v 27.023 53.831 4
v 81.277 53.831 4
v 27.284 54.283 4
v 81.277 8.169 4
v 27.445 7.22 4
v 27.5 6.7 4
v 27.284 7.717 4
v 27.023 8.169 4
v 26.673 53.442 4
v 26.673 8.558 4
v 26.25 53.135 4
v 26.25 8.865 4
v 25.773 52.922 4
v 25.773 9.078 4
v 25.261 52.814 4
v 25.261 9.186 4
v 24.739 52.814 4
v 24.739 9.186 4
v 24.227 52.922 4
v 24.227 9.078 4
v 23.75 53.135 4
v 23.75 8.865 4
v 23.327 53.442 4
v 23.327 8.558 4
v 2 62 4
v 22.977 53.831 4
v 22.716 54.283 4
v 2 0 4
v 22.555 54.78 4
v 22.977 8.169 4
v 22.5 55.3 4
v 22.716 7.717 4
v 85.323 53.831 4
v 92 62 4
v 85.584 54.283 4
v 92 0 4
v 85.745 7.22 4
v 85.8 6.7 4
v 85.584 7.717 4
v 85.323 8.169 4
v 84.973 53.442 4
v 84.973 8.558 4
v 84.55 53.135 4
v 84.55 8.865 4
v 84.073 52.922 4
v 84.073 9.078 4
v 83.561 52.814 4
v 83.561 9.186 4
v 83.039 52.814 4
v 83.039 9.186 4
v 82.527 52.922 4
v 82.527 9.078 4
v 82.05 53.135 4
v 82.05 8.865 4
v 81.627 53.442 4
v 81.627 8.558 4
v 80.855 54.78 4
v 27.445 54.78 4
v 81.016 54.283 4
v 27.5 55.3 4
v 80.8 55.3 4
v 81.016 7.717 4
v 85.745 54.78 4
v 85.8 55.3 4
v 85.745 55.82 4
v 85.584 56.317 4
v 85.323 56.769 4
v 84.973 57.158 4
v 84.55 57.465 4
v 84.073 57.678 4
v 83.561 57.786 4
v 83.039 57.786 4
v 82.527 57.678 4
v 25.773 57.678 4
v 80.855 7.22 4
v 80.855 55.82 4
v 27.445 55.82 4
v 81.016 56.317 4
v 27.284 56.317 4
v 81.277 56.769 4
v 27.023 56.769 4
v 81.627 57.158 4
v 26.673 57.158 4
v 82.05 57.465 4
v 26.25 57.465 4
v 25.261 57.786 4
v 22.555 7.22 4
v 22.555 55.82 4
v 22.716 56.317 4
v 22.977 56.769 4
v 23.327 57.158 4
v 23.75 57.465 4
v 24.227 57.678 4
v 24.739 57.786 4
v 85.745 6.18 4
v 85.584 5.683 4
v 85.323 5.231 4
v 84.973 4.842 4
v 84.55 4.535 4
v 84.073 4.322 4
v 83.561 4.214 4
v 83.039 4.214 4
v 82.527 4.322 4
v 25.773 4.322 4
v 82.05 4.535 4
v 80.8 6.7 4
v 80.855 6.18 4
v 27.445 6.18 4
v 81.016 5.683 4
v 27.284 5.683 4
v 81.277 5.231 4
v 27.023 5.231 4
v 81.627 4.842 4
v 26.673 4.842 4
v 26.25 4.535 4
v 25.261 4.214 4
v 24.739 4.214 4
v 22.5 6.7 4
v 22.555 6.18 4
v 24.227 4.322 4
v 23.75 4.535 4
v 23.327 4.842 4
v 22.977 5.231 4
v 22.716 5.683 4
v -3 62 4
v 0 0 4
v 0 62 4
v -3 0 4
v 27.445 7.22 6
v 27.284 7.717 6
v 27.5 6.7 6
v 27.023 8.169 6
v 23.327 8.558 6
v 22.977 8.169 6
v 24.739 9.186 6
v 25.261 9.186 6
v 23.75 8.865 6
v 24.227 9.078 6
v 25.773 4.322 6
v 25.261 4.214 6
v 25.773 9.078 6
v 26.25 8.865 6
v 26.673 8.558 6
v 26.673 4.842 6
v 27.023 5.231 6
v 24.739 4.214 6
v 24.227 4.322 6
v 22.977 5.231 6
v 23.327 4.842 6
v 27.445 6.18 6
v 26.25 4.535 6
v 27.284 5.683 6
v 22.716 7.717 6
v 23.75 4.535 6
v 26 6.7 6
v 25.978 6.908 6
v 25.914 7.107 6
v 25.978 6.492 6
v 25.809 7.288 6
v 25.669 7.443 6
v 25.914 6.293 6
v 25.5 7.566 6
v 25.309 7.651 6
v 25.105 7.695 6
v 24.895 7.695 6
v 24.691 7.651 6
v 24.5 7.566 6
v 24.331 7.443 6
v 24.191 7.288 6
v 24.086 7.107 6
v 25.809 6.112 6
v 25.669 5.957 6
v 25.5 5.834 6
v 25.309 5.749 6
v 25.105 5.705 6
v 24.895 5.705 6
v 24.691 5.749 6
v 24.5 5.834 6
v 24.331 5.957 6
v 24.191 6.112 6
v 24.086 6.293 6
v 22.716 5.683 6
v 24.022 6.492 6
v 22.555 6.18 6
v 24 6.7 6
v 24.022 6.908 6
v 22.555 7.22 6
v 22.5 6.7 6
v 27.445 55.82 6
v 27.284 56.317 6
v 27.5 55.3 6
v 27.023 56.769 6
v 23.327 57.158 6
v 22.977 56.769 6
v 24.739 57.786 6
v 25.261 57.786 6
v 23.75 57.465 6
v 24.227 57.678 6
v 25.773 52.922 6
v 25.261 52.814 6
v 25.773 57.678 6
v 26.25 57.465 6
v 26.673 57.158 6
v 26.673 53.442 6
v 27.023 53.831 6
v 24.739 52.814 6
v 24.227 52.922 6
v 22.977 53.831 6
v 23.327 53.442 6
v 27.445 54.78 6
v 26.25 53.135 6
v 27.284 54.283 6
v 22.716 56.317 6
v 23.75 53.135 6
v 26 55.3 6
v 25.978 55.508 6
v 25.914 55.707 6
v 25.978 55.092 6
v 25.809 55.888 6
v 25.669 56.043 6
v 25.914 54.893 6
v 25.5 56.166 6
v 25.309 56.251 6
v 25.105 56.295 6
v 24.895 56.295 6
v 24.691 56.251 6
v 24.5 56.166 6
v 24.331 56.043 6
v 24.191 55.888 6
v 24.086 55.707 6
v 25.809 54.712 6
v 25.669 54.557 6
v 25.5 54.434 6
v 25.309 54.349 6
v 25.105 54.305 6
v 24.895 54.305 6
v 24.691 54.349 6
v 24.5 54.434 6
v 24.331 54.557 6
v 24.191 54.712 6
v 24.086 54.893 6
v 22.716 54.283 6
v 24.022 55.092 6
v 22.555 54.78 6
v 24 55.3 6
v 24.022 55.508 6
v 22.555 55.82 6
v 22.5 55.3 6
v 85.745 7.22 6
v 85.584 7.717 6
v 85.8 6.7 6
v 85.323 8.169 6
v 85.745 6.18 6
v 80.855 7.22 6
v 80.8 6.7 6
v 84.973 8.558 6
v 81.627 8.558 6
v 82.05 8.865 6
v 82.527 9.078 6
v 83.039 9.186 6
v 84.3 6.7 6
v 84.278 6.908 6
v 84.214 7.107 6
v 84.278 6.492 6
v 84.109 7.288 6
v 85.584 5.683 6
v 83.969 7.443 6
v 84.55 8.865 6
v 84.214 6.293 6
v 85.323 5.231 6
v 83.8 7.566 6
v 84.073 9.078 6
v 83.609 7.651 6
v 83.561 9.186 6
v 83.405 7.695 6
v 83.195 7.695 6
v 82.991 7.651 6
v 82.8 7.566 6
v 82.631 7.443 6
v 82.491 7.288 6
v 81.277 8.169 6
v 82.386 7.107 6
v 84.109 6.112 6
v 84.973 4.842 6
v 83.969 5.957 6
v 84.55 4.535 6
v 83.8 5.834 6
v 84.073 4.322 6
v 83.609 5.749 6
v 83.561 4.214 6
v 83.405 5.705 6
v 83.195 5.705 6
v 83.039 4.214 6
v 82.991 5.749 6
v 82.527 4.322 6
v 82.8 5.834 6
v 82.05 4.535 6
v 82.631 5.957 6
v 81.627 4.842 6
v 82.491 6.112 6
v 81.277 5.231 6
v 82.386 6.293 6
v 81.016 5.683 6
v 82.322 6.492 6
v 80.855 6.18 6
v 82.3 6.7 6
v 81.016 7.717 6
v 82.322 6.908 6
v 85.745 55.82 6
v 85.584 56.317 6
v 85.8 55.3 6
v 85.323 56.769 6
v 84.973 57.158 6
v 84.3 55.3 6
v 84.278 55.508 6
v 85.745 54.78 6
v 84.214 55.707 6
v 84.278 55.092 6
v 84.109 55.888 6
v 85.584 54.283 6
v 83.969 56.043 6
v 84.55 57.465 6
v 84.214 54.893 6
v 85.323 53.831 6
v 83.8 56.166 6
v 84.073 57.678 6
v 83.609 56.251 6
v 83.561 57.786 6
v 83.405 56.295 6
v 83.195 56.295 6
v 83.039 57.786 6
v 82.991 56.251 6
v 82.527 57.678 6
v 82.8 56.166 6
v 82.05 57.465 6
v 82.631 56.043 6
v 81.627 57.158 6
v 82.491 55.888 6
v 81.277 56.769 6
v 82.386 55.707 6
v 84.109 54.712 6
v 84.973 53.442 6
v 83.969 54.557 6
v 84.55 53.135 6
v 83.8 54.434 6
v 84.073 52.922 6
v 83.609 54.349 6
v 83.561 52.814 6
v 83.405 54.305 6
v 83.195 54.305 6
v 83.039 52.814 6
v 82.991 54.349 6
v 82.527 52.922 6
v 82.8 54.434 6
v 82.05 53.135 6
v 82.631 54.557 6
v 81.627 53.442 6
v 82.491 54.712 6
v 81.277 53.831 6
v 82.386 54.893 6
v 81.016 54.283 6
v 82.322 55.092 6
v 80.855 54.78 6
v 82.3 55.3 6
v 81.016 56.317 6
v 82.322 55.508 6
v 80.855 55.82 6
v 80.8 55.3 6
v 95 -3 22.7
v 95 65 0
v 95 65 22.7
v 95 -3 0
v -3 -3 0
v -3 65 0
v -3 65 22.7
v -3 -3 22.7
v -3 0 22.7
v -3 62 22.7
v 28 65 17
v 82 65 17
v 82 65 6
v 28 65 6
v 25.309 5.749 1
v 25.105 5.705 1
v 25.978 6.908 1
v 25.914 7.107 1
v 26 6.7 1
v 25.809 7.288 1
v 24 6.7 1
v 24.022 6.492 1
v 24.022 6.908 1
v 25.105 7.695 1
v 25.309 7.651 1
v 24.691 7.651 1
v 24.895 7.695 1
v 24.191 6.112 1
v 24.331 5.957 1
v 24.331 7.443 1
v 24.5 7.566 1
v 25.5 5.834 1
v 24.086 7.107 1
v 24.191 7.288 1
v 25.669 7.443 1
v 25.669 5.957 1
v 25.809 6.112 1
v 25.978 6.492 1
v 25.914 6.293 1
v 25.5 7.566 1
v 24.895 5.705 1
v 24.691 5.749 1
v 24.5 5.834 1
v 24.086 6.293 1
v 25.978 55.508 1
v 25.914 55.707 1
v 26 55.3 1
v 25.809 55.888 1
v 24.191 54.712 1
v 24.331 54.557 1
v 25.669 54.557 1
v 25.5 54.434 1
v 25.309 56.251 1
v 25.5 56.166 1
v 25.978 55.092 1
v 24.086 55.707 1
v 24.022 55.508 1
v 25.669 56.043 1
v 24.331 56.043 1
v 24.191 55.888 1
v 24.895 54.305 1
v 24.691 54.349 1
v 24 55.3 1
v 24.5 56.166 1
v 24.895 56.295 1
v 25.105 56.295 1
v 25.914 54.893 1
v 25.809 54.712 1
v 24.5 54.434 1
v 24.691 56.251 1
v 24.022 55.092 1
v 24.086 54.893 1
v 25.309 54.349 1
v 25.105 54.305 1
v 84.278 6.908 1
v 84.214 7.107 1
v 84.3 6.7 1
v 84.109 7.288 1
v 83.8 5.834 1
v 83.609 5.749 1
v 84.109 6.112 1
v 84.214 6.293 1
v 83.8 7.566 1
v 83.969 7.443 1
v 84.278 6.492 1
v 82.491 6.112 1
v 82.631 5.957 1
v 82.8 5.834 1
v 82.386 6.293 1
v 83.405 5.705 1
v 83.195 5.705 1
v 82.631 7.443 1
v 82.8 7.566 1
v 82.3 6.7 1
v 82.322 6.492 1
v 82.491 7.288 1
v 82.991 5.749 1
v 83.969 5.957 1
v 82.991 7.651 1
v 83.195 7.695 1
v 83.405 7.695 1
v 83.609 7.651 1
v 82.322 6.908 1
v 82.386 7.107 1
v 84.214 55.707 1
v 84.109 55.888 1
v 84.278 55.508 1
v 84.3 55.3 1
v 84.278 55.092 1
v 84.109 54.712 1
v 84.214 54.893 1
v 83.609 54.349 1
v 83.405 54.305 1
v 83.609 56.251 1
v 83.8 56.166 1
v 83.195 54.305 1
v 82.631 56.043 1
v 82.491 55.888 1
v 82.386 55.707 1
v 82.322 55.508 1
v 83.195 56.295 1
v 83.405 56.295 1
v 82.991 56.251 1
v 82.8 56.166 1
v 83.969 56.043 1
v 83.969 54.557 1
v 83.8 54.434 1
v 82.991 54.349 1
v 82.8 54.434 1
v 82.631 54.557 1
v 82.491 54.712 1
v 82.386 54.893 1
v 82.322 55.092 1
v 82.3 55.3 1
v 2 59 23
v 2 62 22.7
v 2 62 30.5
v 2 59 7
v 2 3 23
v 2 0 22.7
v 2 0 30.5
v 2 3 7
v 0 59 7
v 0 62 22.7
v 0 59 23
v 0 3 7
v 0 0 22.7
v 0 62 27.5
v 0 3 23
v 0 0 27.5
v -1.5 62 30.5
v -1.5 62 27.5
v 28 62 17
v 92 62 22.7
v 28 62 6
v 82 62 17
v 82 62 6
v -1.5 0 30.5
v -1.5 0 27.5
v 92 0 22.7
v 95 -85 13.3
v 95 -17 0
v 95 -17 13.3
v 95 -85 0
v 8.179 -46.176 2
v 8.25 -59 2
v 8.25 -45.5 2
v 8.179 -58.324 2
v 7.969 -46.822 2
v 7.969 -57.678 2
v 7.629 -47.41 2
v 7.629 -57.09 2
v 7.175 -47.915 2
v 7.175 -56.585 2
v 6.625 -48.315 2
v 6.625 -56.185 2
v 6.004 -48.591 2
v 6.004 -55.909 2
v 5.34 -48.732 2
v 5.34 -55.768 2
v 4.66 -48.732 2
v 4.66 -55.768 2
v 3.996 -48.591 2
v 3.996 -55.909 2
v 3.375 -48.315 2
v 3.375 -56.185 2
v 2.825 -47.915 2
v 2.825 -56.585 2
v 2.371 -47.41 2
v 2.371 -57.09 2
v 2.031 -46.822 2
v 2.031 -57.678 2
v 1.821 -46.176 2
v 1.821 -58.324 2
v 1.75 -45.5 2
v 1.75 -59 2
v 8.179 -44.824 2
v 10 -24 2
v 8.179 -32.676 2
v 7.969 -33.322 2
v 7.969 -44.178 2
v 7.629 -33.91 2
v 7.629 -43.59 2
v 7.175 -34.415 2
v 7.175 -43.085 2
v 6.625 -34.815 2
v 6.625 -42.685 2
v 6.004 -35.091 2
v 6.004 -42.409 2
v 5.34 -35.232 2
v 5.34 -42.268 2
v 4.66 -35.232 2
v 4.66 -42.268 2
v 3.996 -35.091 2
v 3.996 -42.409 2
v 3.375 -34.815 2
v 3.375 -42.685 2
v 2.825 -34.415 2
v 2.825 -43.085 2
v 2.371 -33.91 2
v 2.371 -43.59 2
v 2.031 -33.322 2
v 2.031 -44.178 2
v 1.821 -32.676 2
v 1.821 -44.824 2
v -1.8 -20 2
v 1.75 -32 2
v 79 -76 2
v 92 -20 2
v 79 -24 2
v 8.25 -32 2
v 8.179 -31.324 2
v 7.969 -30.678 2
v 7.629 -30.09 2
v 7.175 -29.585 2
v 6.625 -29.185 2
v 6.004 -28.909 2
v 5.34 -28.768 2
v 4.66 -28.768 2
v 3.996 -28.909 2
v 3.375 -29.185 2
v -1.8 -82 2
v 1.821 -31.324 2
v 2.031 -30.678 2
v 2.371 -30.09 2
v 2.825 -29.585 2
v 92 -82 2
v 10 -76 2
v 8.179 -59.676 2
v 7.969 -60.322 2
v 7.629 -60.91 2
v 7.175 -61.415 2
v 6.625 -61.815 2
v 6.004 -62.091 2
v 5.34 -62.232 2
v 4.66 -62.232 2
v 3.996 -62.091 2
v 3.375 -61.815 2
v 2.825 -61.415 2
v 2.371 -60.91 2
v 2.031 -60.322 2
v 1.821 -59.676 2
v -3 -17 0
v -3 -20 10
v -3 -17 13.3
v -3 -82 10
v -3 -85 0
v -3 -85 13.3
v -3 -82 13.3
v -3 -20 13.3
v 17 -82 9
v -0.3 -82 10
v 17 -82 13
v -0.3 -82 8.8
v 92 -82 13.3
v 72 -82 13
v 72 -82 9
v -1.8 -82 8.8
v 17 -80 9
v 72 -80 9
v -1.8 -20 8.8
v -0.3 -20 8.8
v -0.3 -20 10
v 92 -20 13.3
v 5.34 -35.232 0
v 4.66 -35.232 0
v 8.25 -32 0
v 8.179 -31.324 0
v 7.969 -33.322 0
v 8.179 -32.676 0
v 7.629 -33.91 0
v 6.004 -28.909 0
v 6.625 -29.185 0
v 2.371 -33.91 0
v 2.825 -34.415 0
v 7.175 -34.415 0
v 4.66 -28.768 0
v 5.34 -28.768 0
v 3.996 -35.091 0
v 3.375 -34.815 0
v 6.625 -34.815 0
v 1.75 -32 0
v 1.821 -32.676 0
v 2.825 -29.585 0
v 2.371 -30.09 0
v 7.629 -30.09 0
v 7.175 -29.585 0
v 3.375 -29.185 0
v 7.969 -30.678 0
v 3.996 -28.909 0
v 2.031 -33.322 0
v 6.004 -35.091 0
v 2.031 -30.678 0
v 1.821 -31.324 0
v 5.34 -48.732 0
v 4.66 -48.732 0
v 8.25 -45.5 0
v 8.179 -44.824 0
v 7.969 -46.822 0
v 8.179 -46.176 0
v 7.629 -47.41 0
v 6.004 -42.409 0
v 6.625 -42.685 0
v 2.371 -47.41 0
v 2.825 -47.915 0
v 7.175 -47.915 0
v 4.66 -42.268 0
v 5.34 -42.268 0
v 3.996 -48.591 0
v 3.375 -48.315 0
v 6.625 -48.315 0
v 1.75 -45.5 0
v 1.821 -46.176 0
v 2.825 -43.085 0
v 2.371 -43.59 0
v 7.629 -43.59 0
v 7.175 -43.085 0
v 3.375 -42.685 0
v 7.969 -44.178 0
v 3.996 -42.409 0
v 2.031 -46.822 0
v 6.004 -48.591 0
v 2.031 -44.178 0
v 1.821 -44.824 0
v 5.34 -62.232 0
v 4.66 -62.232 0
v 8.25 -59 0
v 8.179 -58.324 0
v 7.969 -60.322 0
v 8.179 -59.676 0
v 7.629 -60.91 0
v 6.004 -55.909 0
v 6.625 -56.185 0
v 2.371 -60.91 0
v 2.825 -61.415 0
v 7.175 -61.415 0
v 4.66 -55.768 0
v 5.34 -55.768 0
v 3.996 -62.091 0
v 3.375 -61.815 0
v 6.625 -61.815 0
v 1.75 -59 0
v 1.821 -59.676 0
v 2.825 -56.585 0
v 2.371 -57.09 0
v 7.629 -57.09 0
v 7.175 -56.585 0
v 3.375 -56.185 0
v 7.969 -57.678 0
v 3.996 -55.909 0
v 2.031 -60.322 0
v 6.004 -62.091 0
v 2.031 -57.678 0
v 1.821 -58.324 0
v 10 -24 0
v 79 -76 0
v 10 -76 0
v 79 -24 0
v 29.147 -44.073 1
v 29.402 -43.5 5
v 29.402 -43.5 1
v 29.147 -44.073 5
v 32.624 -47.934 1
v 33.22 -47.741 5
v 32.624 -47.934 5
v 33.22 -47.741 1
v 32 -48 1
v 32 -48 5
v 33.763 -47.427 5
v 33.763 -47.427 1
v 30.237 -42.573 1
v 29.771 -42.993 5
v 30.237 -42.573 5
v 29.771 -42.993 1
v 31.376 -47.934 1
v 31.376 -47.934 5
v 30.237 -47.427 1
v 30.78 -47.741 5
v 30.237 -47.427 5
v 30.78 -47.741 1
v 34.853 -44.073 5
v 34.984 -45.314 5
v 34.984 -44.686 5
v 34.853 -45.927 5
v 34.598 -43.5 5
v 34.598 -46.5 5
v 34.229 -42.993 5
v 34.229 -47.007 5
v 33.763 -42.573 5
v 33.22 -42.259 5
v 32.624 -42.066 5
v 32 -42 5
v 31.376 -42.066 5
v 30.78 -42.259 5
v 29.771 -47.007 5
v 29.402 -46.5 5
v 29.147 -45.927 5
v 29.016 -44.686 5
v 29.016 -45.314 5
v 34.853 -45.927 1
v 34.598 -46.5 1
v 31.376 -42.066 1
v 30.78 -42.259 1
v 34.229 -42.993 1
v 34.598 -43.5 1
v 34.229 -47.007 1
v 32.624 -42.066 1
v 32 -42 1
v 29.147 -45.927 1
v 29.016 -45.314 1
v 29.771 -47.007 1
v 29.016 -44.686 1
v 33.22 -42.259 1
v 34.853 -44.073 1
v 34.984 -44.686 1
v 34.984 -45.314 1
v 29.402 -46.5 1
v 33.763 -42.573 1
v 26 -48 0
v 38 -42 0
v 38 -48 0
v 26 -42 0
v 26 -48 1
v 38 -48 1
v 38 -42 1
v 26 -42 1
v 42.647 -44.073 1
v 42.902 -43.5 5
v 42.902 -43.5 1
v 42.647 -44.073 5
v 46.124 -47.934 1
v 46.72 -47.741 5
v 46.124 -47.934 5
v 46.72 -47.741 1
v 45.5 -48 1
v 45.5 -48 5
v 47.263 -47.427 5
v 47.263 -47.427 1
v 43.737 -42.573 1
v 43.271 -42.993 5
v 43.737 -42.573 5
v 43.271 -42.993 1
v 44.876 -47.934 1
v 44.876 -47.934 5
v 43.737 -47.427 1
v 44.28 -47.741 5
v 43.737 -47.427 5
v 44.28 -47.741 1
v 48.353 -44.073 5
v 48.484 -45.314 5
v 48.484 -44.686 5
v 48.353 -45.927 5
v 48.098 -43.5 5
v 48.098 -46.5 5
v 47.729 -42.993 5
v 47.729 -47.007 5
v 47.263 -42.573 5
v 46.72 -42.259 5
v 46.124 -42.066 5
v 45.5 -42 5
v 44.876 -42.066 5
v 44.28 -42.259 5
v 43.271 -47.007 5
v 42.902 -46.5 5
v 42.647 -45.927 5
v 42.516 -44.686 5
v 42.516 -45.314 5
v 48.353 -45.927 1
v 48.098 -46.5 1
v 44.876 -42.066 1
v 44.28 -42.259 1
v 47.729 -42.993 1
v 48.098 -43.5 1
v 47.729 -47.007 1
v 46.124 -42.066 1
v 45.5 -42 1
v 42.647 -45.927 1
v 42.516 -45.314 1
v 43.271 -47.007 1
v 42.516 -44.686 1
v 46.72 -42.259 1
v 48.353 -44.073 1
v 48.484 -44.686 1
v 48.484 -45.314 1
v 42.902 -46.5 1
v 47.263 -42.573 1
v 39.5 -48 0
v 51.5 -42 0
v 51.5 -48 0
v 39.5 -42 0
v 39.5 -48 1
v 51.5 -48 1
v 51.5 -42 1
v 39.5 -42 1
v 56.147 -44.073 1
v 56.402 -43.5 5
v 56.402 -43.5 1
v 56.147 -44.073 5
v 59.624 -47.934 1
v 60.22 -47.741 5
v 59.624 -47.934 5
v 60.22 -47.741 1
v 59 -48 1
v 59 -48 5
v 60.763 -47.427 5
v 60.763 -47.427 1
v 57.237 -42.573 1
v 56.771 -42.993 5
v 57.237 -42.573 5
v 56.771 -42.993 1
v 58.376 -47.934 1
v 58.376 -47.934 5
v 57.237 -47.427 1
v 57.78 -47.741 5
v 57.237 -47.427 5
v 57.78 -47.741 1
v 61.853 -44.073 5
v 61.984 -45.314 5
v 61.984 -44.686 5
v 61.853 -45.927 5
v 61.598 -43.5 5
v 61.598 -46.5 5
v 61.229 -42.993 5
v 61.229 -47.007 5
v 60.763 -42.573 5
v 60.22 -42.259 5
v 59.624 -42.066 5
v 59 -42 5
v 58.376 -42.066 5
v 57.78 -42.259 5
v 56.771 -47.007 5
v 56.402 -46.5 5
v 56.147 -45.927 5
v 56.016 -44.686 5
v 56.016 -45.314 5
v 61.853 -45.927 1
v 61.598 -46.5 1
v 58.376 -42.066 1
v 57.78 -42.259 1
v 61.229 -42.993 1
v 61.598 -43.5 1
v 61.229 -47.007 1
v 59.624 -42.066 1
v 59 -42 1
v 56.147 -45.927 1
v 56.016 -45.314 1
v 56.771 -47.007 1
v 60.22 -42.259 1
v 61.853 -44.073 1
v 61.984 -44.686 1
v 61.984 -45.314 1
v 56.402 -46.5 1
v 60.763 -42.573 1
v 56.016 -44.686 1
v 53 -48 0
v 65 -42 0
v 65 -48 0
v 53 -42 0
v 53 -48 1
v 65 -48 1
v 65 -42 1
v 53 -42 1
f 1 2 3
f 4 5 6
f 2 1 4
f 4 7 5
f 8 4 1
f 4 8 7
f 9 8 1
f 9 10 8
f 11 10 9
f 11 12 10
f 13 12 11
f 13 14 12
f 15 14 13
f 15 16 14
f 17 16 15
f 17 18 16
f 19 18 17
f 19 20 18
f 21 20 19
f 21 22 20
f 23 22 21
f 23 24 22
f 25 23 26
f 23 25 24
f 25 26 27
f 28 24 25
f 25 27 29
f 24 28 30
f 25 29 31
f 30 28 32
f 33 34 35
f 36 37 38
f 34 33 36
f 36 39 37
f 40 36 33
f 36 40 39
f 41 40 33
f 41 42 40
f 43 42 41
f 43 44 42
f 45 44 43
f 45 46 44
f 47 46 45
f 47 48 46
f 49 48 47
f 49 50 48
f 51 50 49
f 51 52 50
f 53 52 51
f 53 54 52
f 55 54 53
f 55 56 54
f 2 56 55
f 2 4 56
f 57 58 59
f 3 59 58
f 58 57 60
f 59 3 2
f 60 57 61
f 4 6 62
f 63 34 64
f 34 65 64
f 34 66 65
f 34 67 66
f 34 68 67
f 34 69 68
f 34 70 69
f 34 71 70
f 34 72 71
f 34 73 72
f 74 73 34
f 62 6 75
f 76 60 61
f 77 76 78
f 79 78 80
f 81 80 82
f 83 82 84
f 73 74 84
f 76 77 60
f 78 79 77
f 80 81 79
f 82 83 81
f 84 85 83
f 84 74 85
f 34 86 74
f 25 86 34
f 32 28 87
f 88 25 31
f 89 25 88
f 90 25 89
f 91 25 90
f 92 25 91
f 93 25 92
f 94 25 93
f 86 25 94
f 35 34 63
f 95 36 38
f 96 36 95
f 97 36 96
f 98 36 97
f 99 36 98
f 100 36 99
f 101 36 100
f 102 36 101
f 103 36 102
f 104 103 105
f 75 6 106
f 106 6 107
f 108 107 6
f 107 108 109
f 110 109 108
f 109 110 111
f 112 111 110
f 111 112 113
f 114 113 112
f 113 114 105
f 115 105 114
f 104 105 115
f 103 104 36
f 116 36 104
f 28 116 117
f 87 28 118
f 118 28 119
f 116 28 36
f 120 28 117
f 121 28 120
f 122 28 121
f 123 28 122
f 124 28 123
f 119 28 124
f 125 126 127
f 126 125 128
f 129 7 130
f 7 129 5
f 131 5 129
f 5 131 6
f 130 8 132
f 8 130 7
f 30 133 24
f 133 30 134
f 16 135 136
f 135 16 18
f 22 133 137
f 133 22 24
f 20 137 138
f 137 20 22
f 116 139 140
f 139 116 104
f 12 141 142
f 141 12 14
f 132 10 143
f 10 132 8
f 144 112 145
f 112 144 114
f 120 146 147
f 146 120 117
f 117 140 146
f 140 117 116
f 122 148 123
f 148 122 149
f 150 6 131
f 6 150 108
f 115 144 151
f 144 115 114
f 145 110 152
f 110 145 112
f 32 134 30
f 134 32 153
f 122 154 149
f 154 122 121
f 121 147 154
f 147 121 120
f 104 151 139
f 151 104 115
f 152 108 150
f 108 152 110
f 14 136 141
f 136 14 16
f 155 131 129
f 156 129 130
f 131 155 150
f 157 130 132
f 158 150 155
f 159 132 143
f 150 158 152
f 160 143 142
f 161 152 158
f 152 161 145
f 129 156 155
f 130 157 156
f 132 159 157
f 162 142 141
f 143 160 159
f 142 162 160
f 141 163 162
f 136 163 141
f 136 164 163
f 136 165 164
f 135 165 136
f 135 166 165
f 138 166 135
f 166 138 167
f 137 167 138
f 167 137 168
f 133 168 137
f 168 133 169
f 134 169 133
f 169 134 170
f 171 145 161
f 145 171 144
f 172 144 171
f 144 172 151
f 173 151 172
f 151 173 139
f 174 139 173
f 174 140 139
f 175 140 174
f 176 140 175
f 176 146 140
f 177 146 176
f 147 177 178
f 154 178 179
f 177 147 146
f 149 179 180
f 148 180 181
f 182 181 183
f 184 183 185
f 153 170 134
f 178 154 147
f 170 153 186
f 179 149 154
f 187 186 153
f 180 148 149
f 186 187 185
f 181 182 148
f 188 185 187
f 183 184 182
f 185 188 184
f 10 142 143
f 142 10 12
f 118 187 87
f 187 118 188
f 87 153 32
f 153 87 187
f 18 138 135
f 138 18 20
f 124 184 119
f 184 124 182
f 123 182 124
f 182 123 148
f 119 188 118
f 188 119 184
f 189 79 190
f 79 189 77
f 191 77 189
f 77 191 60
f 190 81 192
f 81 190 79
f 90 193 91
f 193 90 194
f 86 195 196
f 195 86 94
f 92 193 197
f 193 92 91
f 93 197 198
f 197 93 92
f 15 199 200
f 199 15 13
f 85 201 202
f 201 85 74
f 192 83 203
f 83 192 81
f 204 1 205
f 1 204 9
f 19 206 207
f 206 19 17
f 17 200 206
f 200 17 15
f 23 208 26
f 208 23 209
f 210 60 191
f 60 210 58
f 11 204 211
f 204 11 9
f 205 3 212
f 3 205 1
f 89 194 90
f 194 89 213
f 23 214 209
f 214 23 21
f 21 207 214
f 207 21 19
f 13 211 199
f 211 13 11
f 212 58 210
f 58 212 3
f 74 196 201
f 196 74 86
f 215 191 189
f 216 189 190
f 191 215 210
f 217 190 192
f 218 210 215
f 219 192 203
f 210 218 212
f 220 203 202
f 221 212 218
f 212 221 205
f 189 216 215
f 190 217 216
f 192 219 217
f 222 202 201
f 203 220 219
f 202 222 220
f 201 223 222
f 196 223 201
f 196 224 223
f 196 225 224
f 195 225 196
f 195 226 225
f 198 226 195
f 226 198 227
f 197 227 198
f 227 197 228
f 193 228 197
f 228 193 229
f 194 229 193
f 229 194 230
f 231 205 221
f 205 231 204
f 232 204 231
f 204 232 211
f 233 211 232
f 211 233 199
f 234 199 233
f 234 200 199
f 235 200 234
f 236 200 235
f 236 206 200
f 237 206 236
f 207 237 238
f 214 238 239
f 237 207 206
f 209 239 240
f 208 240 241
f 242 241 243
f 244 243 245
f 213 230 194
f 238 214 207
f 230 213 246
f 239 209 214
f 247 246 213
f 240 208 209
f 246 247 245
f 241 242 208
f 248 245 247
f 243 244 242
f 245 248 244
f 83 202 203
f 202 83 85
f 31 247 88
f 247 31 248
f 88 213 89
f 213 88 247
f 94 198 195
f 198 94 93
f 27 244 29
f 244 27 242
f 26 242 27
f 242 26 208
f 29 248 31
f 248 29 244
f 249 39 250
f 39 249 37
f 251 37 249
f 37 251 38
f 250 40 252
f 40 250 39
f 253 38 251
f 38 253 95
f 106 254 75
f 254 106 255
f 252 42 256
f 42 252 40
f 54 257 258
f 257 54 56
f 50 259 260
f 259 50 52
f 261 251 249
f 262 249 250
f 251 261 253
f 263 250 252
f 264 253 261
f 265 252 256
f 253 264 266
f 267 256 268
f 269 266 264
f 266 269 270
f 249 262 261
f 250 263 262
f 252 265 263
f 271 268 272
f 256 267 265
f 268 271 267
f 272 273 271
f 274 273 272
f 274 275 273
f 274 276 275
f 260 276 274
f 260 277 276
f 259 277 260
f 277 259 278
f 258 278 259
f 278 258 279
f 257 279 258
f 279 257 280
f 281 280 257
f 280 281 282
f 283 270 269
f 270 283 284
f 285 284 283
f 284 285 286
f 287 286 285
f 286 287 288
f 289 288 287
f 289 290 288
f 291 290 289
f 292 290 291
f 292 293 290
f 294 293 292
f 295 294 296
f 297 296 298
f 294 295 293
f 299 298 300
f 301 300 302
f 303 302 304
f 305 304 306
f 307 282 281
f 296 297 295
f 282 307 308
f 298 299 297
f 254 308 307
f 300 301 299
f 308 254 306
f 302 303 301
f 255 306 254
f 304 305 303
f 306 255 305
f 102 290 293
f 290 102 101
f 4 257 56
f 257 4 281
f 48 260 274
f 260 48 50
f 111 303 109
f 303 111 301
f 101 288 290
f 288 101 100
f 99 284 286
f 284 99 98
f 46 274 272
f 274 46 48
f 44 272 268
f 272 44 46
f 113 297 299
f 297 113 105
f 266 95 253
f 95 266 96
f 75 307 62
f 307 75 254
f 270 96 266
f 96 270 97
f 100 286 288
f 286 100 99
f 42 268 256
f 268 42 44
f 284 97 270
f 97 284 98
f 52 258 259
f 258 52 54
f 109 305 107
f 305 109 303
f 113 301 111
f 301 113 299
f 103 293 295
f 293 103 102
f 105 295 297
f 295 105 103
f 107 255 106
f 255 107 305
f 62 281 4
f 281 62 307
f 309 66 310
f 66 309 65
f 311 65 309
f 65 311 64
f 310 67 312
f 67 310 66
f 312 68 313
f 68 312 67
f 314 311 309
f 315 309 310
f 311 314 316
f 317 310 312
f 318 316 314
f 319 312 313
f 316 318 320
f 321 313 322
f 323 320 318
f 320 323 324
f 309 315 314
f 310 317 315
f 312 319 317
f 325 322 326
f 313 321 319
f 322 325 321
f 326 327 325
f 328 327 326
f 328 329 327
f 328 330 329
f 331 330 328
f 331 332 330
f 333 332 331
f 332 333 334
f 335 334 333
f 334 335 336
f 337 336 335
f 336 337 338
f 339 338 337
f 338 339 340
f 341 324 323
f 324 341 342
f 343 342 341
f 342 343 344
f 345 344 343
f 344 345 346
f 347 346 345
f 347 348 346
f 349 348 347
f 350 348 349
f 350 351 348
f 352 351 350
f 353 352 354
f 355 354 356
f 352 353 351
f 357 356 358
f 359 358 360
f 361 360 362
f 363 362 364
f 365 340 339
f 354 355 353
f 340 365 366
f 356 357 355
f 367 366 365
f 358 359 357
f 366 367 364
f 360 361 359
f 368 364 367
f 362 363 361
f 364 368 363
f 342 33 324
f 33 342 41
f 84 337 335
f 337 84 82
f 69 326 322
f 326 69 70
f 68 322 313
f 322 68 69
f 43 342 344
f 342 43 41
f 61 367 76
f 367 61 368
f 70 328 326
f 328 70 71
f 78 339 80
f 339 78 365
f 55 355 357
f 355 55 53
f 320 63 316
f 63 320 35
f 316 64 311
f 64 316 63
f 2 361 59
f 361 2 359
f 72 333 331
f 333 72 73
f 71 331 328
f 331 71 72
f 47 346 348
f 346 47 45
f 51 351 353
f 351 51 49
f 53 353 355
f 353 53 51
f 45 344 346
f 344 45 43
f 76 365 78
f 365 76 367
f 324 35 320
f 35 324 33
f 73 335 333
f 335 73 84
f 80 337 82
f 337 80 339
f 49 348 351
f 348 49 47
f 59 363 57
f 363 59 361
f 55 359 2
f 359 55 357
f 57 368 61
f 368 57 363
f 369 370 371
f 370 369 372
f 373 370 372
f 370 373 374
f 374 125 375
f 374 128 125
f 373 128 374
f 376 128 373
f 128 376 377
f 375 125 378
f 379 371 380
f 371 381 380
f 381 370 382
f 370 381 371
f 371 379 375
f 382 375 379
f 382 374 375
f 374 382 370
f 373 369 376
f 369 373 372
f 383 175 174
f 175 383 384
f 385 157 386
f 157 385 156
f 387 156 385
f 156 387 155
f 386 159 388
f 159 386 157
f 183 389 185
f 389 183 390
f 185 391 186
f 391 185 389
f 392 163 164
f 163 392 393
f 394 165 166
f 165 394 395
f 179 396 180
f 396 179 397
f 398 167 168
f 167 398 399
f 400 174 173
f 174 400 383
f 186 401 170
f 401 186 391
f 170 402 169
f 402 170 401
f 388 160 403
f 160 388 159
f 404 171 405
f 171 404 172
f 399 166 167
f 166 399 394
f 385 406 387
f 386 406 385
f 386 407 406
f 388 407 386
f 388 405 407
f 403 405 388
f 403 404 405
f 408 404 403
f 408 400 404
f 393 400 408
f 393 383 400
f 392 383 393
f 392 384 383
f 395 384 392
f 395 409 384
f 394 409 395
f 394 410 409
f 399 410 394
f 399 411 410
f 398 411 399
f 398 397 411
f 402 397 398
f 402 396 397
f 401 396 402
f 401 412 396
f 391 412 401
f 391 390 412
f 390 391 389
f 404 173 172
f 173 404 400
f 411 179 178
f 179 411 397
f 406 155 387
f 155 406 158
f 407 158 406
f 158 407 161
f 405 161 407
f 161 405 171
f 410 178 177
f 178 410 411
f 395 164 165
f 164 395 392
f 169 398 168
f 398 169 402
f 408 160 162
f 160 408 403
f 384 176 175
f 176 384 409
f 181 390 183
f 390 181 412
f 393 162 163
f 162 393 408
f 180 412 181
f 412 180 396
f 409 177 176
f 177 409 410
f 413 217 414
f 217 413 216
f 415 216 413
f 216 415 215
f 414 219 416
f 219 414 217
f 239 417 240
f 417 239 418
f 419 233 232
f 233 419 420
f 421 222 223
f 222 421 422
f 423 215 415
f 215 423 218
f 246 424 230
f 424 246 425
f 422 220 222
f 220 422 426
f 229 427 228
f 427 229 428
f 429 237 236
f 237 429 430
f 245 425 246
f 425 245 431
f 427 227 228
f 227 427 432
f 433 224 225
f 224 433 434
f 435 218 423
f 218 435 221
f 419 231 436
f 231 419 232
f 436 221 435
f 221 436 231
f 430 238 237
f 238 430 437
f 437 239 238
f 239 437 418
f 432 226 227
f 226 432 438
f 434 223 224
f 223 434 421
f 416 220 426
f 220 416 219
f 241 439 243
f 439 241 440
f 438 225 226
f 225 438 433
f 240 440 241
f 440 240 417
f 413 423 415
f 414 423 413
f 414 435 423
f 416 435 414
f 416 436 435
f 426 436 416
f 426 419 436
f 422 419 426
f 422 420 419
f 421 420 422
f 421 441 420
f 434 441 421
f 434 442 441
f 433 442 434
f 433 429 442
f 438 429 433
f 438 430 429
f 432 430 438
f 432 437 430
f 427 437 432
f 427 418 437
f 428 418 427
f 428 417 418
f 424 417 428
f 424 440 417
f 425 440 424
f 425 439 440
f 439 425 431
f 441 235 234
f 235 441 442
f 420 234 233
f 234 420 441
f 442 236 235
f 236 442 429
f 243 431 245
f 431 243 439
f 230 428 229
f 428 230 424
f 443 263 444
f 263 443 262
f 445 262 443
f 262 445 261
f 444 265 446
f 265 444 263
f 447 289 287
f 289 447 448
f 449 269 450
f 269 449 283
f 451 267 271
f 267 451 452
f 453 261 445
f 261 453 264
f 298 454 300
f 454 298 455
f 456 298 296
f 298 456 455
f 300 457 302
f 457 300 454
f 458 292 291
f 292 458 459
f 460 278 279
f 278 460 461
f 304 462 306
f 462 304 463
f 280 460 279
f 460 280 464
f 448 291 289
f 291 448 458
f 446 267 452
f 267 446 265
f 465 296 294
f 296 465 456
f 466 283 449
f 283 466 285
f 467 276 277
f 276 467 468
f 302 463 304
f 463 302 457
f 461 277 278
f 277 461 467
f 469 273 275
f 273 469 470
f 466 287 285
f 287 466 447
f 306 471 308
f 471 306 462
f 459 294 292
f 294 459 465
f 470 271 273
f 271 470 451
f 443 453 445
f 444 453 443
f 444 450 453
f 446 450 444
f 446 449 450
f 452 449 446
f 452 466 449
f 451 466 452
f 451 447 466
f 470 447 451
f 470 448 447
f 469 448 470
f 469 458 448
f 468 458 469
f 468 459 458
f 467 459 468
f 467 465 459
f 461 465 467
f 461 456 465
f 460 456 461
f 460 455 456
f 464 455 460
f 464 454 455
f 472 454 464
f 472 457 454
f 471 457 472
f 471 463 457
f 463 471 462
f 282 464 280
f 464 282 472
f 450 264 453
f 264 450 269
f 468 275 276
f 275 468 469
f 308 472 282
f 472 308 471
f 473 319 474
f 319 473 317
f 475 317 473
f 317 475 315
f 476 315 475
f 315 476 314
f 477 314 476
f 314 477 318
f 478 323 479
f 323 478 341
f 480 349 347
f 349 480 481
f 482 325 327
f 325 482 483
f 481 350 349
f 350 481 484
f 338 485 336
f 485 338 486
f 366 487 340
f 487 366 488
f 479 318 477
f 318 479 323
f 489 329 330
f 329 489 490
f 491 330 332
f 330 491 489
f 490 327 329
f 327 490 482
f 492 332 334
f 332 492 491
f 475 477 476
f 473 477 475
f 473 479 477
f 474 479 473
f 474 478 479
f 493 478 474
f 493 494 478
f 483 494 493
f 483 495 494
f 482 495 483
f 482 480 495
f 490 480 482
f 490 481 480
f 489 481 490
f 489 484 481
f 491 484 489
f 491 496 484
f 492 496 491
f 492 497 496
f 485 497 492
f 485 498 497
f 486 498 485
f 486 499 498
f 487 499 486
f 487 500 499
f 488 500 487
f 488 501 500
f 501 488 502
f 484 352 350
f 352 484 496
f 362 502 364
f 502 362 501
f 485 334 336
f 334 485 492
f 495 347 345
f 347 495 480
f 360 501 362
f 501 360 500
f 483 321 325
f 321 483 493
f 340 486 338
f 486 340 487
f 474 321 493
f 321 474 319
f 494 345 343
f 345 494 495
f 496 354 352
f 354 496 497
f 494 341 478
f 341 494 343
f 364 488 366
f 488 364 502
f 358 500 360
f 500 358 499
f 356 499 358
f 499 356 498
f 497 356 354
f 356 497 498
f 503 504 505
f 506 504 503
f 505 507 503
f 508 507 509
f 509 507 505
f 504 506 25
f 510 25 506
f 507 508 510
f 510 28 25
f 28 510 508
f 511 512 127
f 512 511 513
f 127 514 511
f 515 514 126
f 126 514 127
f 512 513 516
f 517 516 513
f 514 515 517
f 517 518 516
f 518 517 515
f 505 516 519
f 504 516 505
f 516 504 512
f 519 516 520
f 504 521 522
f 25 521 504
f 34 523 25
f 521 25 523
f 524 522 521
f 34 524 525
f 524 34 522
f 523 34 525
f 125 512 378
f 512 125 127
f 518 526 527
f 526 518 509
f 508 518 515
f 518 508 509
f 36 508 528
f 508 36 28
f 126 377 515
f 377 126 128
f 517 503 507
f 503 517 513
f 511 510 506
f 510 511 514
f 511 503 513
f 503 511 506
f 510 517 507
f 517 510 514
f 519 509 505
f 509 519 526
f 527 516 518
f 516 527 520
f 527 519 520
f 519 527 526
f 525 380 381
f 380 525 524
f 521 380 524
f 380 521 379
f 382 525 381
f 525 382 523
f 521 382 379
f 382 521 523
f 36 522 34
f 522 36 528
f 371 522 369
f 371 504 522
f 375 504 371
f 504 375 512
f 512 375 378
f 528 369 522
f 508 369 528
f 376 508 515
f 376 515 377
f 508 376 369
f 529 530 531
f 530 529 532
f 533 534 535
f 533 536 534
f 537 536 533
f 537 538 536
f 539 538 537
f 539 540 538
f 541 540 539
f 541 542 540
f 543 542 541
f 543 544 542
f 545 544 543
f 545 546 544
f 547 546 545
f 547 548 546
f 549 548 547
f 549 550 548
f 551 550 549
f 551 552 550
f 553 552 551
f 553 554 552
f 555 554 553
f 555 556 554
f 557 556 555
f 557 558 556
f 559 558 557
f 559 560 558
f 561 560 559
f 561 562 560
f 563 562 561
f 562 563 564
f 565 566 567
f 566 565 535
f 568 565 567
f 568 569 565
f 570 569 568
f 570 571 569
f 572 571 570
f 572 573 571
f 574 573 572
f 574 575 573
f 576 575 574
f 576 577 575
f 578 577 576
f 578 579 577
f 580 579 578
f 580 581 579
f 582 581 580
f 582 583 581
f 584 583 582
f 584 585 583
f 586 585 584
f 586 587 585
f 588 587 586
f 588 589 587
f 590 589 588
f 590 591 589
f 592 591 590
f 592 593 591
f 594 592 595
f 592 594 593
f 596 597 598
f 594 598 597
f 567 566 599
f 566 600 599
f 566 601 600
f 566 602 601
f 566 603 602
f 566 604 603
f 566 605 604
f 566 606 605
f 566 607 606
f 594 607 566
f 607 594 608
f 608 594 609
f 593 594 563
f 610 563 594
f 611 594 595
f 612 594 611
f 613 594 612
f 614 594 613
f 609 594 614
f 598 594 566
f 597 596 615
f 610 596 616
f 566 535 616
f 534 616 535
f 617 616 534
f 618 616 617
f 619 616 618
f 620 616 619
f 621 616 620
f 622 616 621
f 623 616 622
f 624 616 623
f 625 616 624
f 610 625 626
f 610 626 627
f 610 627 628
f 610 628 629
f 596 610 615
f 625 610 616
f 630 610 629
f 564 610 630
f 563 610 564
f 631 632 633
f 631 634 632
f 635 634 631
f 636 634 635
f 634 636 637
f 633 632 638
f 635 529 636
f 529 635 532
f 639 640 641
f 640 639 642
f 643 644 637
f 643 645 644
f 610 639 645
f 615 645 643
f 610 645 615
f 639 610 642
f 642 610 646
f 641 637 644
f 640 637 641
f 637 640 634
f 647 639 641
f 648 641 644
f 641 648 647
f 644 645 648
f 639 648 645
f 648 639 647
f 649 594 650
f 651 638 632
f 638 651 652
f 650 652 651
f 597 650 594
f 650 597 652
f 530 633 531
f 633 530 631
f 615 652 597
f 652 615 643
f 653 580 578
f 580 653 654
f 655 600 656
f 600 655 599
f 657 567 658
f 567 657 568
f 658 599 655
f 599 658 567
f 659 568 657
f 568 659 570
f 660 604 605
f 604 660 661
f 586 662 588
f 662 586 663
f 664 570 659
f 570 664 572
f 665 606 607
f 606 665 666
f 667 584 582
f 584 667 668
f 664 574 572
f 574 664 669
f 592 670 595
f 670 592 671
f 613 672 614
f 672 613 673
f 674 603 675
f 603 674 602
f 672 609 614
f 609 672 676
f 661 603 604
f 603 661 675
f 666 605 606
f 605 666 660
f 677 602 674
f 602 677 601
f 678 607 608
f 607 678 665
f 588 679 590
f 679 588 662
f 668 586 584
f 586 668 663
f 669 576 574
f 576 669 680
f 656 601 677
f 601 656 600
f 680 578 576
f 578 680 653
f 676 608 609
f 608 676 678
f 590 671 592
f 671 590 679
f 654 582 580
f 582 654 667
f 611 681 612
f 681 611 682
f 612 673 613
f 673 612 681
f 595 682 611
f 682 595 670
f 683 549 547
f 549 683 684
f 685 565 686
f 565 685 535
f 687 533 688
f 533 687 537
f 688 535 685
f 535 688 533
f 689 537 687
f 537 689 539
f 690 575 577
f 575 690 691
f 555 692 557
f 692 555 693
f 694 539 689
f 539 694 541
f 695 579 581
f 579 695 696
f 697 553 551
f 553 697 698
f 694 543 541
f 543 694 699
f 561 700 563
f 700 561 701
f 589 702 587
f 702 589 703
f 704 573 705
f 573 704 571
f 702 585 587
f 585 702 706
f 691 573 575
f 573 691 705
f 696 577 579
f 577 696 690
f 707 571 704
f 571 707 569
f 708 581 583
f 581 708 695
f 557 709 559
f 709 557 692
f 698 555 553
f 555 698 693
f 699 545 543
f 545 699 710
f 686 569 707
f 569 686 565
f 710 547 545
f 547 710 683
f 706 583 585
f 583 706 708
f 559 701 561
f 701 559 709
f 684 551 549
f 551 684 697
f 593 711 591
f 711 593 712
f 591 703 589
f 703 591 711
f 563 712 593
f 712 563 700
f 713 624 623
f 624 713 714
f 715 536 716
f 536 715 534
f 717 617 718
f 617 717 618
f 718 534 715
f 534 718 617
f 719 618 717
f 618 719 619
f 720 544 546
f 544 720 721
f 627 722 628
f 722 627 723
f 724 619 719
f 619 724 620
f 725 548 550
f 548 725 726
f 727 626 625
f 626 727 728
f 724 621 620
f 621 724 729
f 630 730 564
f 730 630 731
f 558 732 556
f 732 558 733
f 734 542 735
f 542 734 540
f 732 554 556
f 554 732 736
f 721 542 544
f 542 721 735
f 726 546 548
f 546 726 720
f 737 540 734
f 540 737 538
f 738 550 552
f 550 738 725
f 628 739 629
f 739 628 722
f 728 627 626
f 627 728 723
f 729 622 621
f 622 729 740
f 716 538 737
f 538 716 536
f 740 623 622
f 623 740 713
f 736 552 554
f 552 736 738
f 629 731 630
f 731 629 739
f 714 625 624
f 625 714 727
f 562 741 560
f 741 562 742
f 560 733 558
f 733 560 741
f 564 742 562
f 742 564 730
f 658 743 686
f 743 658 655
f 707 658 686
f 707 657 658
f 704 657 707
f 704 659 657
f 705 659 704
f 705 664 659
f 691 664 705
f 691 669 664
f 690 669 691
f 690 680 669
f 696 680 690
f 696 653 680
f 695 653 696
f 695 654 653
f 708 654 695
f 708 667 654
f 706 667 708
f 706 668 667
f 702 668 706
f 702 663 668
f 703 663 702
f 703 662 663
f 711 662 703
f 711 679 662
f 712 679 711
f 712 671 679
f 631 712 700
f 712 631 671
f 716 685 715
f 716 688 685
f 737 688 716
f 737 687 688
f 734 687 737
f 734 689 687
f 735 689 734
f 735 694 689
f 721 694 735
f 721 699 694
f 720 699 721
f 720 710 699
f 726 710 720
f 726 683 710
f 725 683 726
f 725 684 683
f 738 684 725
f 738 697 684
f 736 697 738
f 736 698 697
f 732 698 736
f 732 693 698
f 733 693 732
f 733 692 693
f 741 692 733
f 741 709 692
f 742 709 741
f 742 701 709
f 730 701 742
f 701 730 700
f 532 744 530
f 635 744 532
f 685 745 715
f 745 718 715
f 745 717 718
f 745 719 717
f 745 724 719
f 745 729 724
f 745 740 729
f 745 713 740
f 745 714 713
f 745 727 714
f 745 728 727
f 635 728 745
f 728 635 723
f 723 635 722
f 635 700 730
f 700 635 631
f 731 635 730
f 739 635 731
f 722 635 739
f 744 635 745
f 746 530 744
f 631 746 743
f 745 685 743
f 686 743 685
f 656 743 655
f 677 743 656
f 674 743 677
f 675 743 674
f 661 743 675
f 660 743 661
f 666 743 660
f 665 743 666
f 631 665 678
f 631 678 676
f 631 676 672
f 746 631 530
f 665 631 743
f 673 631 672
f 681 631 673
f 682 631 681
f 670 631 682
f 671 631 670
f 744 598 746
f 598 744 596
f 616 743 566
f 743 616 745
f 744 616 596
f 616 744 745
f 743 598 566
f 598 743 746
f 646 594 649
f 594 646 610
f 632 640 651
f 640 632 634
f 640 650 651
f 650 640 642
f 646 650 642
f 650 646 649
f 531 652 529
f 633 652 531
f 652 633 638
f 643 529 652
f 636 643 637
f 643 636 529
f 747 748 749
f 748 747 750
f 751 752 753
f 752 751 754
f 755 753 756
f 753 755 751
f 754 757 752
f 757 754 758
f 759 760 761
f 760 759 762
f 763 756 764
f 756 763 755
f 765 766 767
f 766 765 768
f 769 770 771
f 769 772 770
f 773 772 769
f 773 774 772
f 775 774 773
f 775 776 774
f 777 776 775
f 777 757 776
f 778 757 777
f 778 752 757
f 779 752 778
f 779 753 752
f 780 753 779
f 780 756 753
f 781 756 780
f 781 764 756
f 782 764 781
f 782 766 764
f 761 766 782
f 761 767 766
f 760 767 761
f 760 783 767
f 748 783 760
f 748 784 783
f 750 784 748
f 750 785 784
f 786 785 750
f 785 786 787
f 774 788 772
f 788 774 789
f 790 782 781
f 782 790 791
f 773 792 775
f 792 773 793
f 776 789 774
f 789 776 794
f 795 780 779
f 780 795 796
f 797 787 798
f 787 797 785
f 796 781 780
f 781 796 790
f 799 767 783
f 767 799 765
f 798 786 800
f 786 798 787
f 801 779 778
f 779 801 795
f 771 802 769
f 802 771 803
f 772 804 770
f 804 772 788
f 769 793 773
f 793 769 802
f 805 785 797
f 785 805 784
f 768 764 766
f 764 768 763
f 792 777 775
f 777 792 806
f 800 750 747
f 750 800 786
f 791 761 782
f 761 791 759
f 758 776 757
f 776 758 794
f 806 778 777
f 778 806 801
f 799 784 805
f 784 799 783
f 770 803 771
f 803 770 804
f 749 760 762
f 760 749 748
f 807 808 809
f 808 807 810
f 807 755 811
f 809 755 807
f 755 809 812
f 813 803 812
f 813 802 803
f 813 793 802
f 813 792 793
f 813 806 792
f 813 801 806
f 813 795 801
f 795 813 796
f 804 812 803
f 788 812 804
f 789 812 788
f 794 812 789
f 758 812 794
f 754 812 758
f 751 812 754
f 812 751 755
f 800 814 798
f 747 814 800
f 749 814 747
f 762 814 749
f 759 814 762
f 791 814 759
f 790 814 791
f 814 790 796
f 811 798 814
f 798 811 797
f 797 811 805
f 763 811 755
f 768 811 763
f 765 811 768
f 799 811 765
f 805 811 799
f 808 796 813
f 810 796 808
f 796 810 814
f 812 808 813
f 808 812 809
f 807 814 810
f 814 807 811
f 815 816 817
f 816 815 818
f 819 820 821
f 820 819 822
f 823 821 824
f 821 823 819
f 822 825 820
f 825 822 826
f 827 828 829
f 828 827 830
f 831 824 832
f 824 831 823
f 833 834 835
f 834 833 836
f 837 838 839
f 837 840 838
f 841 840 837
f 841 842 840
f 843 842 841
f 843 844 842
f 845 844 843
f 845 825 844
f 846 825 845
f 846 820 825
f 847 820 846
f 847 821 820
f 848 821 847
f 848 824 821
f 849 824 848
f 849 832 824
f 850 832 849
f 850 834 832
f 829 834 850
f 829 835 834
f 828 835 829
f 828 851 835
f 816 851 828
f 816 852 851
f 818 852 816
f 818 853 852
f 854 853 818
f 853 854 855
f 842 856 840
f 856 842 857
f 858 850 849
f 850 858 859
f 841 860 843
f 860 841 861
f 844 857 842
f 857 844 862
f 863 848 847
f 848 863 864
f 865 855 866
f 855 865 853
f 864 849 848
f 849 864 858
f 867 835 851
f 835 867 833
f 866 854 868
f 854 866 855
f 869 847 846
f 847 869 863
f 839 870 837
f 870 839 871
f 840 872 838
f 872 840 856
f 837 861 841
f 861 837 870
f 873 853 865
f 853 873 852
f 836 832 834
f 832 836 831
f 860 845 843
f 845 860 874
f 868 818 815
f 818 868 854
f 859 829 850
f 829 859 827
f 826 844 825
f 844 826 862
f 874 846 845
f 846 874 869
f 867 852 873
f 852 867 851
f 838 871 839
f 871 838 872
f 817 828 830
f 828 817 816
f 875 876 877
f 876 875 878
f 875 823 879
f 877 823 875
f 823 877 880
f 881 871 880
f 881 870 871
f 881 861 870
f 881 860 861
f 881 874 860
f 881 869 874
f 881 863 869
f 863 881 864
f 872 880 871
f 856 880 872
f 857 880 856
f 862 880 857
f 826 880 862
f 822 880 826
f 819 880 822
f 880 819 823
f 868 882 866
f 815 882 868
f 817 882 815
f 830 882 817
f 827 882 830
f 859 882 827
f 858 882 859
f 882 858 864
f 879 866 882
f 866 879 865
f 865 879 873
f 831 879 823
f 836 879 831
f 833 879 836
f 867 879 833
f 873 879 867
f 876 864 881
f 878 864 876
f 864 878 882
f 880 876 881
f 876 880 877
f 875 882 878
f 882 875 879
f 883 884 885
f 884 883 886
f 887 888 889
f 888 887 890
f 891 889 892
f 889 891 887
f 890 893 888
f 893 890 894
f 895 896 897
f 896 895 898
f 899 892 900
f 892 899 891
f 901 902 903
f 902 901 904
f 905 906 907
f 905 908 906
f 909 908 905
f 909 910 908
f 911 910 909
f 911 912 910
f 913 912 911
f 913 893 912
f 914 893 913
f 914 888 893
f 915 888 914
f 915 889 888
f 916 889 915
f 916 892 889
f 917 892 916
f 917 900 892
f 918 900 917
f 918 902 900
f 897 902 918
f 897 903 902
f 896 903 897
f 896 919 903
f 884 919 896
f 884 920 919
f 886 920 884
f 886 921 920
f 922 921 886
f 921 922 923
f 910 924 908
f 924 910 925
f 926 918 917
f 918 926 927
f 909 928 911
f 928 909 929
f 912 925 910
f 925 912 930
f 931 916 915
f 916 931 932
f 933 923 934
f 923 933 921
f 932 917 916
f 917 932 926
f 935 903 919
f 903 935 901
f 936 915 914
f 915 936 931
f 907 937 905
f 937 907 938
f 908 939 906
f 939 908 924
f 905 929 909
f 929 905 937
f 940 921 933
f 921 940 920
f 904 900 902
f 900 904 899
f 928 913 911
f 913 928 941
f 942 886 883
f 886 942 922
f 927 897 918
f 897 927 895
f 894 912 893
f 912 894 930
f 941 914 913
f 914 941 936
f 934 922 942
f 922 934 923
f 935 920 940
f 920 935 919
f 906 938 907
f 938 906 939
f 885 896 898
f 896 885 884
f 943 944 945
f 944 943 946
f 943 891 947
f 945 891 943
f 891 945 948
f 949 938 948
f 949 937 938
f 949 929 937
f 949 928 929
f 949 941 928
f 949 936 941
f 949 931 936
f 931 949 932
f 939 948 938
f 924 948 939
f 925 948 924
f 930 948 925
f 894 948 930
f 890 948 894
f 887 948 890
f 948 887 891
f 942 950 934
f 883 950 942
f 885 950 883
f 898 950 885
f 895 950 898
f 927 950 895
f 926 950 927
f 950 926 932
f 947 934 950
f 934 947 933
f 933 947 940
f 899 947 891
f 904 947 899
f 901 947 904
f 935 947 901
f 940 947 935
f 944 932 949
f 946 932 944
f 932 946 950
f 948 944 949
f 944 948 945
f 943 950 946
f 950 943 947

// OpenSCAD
cylinder_precision = 0.05;

enclosure_thickness_bottom = 4; // TODO: verify the length of the screws
enclosure_thickness_top = 2;
enclosure_thickness_sides = 3;
display_hole_size = [69, 52];
display_hole_wrt_raspi = [8, 1];
raspi_size = [85, 56, 1];
raspi_pos_wrt_cavity = [2, 3, 2];
raspi_holes_left = 23;
raspi_holes_distance_from_border = 3.7;
raspi_supports_diameter = 5;
raspi_support_screws_diameter = 2;
raspi_front_mask_thickness = 2;
raspi_front_mask_height = 16;
raspi_front_mask_top_height = 8;
raspi_front_mask_snap_size = 1.5;
raspi_front_mark_snap_tolerance = 0.3;
display_board_distance_from_raspi = 20;
display_board_support_thickness = 2;
distance_raspi_bottom_to_display_top = 28;
back_hole_width = 52; // 52 - 35
back_hole_height = 8;
back_hole_extra_size = 1;
back_hole_distance_from_front_raspi = 27;
enclosure_cavity = [92, 62, raspi_pos_wrt_cavity[2]+distance_raspi_bottom_to_display_top];
buttons_distance_from_raspi_left = 3;
first_button_distance_from_raspi_bottom = 9;
buttons_distance_from_each_other = 13.5;
buttons_diameter = 6;
buttons_distance_from_screen_surface = 2;
buttons_top_overflow = 2;
buttons_holes_abbundance = 0.5;


module enclosureBottomWrtCavity() {
    translate([-enclosure_thickness_sides, -enclosure_thickness_sides, -enclosure_thickness_bottom])
        cube([
            enclosure_cavity[0] + enclosure_thickness_sides*2,
            enclosure_cavity[1] + enclosure_thickness_sides*2,
            enclosure_thickness_bottom
        ]);
}

module raspiFrontTopMaskWrtCavity() {
    translate([-enclosure_thickness_sides, 0, enclosure_cavity[2]-raspi_front_mask_top_height]) {
        cube([raspi_front_mask_snap_size-raspi_front_mark_snap_tolerance, enclosure_cavity[1], raspi_front_mask_top_height]);
        cube([enclosure_thickness_sides-raspi_front_mark_snap_tolerance, enclosure_cavity[1], raspi_front_mask_snap_size-raspi_front_mark_snap_tolerance]);
    }
}

module raspiFrontMaskWrtCavity() {
    translate([-enclosure_thickness_sides+raspi_front_mask_snap_size, 0, enclosure_cavity[2]-raspi_front_mask_top_height+raspi_front_mask_snap_size])
        cube([enclosure_thickness_sides+raspi_front_mask_thickness-raspi_front_mask_snap_size, enclosure_cavity[1], raspi_front_mask_snap_size*2]);
    translate([raspi_pos_wrt_cavity[0]-raspi_front_mask_thickness, 0, 0])
        difference() {
            cube([raspi_front_mask_thickness, enclosure_cavity[1], enclosure_cavity[2]-raspi_front_mask_top_height+raspi_front_mask_snap_size*2]);
            translate([-raspi_front_mask_thickness, raspi_pos_wrt_cavity[1], raspi_pos_wrt_cavity[2]+raspi_size[2]])
                cube([raspi_front_mask_thickness*3, raspi_size[1], raspi_front_mask_height]);
        }
}

module enclosureFrontSideWrtCavity() {
    translate([-enclosure_thickness_sides, -enclosure_thickness_sides, 0])
        cube([enclosure_cavity[0] + enclosure_thickness_sides*2, enclosure_thickness_sides, enclosure_cavity[2]]);
}

module enclosureRightSideWrtCavity() {
    translate([enclosure_cavity[0], 0, 0])
        cube([enclosure_thickness_sides, enclosure_cavity[1], enclosure_cavity[2]]);
}

module displayBoardSupport() {
    length_cut = 15;
    translate([length_cut, 0, -display_board_support_thickness*2])
        rotate([90, 0, 0])
            rotate([0, 90, 0])
                linear_extrude(height=raspi_size[0]-length_cut*2)
                    polygon([
                        [0, 0],
                        [-display_board_support_thickness, display_board_support_thickness*2],
                        [0, display_board_support_thickness*2]
                    ]);
}

module enclosureBackSideWrtCavity() {
    difference() {
        translate([-enclosure_thickness_sides, enclosure_cavity[1], 0]) {
            cube([enclosure_cavity[0] + enclosure_thickness_sides*2, enclosure_thickness_sides, enclosure_cavity[2]]);
        }
        translate([back_hole_distance_from_front_raspi + raspi_pos_wrt_cavity[0] - back_hole_extra_size, enclosure_cavity[1]-enclosure_thickness_sides, raspi_pos_wrt_cavity[2]+raspi_size[2] - back_hole_extra_size])
            cube([back_hole_width+back_hole_extra_size*2, back_hole_height, enclosure_thickness_sides*3 + back_hole_extra_size*2]);
    }
    translate([raspi_pos_wrt_cavity[0], enclosure_cavity[1], raspi_pos_wrt_cavity[2] + raspi_size[2] + display_board_distance_from_raspi])
        displayBoardSupport();
}

button_bottom = enclosure_cavity[2] - buttons_distance_from_screen_surface/2;
button_top = enclosure_cavity[2] + enclosure_thickness_top + buttons_top_overflow;
first_button_pos = [
    raspi_pos_wrt_cavity[0]+buttons_distance_from_raspi_left,
    raspi_pos_wrt_cavity[1]+first_button_distance_from_raspi_bottom,
    button_bottom
];

module buttonsWrtToCavity() {
    for (buttonIdx=[0,1,2]) {
        translate([first_button_pos[0], first_button_pos[1] + buttonIdx*buttons_distance_from_each_other, first_button_pos[2]-0.5]) {
            cylinder(r=buttons_diameter/2, h=button_top-button_bottom, $fs=cylinder_precision);
            translate([0, 0, 0.5]) cube([buttons_diameter, buttons_diameter*2, 1], center=true);
        }
    }
}

module enclosureTopSideWrtCavity() {
    z = raspi_pos_wrt_cavity[2]+distance_raspi_bottom_to_display_top;
    difference() {
        translate([-enclosure_thickness_sides, -enclosure_thickness_sides, z])
            cube([
                enclosure_cavity[0]+enclosure_thickness_sides*2,
                enclosure_cavity[1]+enclosure_thickness_sides*2,
                enclosure_thickness_top
                ]);
        // Display hole
        translate([
                raspi_pos_wrt_cavity[0] + display_hole_wrt_raspi[0],
                raspi_pos_wrt_cavity[1] + display_hole_wrt_raspi[1],
                z-enclosure_thickness_top
            ])
            cube([display_hole_size[0], display_hole_size[1], enclosure_thickness_top*3]);
        for (buttonIdx=[0,1,2]) {
            translate([first_button_pos[0], first_button_pos[1] + buttonIdx*buttons_distance_from_each_other, first_button_pos[2]])
                cylinder(r=(buttons_diameter+buttons_holes_abbundance)/2, h=button_top-button_bottom, $fs=cylinder_precision);
        }
    }
}

top_cut_height = raspi_pos_wrt_cavity[2] + raspi_size[2] + display_board_distance_from_raspi - display_board_support_thickness*2-raspi_front_mark_snap_tolerance;

module enclosureBottomWithSupportsWrtCavity() {
    difference() {
        union() {
            enclosureBottomWrtCavity();
            raspiSupportsWrtCavity();
        }
        raspiSupportHolesWrtCavity();
    }
}

module partsToBeSplitWrtToCavity() {
    enclosureFrontSideWrtCavity();
    enclosureRightSideWrtCavity();
    enclosureBackSideWrtCavity();
}

module enclosureBottomWrtToCavity() {
    enclosureBottomWithSupportsWrtCavity();
    raspiFrontMaskWrtCavity();
    difference() {
        partsToBeSplitWrtToCavity();
        translate([-enclosure_cavity[0], -enclosure_cavity[1], top_cut_height])
            cube([enclosure_cavity[0]*3, enclosure_cavity[0]*3, enclosure_cavity[2]]);
    }
}

module enclosureTopWrtToCavity() {
    enclosureTopSideWrtCavity();
    raspiFrontTopMaskWrtCavity();
    difference() {
        partsToBeSplitWrtToCavity();
        translate([-enclosure_cavity[0], -enclosure_cavity[1], top_cut_height-enclosure_cavity[2]])
            cube([enclosure_cavity[0]*3, enclosure_cavity[0]*3, enclosure_cavity[2]]);
    }
}

module raspi() {
    cube(raspi_size);
}

module raspiWrtCavity() {
    translate(raspi_pos_wrt_cavity) raspi();
}

raspi_supports_positions = [
   [raspi_holes_left, raspi_holes_distance_from_border, 0],
   [raspi_holes_left, raspi_size[1]-raspi_holes_distance_from_border, 0],
   [raspi_size[0] - raspi_holes_distance_from_border, raspi_holes_distance_from_border, 0],
   [raspi_size[0] - raspi_holes_distance_from_border, raspi_size[1] - raspi_holes_distance_from_border, 0],
];

module raspiSupportsWrtCavity() {
    r = raspi_supports_diameter / 2;
    h = raspi_pos_wrt_cavity[2];
    translate([raspi_pos_wrt_cavity[0], raspi_pos_wrt_cavity[1], 0]) {
        for (pos=raspi_supports_positions) {
            translate(pos)
                cylinder(r=r, h=h, $fs=cylinder_precision);
        }
    }
}

module raspiSupportHolesWrtCavity() {
    h = raspi_pos_wrt_cavity[2] + enclosure_thickness_bottom;
    translate([raspi_pos_wrt_cavity[0], raspi_pos_wrt_cavity[1], 0]) {
        for (pos=raspi_supports_positions) {
            translate(pos)
                translate([0, 0, -enclosure_thickness_bottom+1])
                    cylinder(r=raspi_support_screws_diameter/2, h=h, $fs=cylinder_precision);
        }
    }
}


module enclosureToPrint() {
    translate([0, 0, enclosure_thickness_bottom])
        enclosureBottomWrtToCavity();

    rotate([180, 0, 0])
        translate([0, 20, -enclosure_cavity[2]-enclosure_thickness_top])
            enclosureTopWrtToCavity();

    translate([20, -40, 0])
        rotate([0, 0, -90])
            translate([0, 0, -first_button_pos[2]+0.5])
                buttonsWrtToCavity();
}

module enclosure() {
    enclosureBottomWrtToCavity();
    enclosureTopWrtToCavity();
}

enclosureToPrint();

//enclosure();
//raspiWrtCavity();
//buttonsWrtToCavity();
